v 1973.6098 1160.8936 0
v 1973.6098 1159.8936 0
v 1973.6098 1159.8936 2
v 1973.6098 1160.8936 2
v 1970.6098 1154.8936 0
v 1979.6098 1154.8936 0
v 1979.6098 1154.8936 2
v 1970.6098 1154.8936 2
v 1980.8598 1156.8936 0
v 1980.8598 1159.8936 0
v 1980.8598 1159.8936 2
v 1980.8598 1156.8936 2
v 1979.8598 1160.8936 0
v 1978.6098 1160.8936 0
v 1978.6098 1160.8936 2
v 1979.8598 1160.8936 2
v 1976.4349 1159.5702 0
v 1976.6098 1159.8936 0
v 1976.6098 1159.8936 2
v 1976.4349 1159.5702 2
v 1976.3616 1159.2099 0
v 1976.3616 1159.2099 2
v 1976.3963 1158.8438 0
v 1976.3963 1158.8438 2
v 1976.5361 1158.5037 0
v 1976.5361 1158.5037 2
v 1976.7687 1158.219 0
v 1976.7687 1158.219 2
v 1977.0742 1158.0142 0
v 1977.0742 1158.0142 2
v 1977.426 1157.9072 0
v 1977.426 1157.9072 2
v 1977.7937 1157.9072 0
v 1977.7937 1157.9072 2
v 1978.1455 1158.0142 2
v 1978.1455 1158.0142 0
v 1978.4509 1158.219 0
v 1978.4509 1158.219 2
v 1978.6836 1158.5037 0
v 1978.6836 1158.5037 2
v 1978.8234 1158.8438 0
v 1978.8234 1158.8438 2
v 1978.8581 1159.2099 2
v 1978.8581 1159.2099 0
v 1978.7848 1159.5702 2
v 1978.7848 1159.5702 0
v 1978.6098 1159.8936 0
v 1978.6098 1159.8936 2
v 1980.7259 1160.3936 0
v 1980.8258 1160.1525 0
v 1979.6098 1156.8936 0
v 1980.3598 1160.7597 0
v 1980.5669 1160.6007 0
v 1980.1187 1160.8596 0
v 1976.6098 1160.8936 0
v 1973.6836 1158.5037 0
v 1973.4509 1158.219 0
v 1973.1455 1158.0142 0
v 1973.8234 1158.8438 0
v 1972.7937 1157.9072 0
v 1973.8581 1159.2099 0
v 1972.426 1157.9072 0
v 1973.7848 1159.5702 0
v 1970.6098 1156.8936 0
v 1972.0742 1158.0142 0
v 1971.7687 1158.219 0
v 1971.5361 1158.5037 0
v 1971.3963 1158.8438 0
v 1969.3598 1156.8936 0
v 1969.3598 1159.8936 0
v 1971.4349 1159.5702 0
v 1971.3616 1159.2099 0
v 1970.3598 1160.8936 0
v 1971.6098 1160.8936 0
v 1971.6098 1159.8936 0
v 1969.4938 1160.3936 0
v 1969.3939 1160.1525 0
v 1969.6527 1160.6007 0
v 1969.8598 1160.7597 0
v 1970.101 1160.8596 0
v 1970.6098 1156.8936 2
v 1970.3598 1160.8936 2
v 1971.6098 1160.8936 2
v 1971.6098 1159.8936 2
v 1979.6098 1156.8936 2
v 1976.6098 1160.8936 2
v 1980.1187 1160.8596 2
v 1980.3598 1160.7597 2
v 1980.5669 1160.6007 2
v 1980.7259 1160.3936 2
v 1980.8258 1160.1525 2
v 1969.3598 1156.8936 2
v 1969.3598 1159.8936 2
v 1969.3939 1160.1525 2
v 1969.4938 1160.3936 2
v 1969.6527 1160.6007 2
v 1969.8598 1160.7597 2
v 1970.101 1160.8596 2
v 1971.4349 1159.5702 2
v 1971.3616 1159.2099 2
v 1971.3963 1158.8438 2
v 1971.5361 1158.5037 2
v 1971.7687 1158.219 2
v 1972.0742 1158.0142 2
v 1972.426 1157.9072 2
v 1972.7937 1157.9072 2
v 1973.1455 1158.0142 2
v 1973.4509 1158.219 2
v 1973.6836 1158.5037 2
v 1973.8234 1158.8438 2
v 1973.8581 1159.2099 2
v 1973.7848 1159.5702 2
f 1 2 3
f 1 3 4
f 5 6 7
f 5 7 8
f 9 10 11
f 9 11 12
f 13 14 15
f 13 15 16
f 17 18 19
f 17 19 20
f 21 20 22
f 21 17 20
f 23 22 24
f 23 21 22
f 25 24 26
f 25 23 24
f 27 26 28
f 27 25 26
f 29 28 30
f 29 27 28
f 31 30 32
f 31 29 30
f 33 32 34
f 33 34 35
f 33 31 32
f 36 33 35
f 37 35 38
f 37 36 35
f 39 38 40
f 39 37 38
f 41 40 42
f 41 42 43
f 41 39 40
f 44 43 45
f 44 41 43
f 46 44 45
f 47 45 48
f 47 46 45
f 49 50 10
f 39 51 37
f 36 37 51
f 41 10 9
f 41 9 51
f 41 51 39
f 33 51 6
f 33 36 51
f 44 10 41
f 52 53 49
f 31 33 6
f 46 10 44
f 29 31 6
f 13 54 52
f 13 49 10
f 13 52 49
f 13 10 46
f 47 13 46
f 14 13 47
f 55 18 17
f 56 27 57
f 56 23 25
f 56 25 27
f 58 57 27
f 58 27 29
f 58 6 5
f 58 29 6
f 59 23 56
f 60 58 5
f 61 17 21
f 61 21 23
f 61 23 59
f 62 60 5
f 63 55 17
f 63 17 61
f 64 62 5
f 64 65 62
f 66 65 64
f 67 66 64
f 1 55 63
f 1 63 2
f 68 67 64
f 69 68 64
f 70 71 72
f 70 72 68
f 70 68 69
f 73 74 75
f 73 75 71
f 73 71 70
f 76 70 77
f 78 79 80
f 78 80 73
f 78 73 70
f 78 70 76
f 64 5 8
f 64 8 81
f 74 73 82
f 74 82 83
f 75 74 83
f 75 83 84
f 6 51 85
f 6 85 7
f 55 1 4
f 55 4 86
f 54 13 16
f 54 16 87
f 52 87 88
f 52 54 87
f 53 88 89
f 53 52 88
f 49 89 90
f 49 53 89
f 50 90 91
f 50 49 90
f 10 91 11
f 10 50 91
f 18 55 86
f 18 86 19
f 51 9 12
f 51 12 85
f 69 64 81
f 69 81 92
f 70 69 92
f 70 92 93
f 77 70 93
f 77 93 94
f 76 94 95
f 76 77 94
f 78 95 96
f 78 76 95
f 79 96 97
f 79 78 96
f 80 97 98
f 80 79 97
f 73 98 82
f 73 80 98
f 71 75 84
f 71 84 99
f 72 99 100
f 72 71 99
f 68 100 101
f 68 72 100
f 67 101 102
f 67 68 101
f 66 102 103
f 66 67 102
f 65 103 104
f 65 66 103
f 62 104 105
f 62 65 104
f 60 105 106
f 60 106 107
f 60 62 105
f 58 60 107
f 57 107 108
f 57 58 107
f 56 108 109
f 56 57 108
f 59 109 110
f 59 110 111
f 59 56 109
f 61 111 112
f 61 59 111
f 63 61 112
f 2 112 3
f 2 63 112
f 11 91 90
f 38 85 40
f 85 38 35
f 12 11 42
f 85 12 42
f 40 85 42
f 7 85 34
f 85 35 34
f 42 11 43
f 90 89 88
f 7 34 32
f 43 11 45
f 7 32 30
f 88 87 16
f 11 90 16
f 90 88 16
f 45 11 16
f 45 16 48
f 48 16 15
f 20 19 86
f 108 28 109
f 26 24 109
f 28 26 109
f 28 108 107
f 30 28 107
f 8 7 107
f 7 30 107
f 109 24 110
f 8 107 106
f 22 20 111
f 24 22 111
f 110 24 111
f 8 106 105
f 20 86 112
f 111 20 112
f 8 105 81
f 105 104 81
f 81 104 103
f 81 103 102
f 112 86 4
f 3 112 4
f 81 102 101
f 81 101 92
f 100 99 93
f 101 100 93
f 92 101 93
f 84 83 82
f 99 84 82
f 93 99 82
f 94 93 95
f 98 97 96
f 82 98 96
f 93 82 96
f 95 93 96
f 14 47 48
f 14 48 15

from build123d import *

# Parameters (mm, degrees)
BOSS_EXTRUDE1_DEPTH = 2


with BuildPart() as part:
    # Model → Boss-Extrude1 (new body)
    with BuildSketch(Plane.XY):
        with BuildLine():
            Line((1971.609841287, 1160.893641222), (1971.609841287, 1159.893641222))
            ThreePointArc((1971.609841287, 1159.893641222), (1972.609841287, 1157.893641222), (1973.609841287, 1159.893641222))
            Line((1973.609841287, 1159.893641222), (1973.609841287, 1160.893641222))
            Line((1973.609841287, 1160.893641222), (1976.609841287, 1160.893641222))
            Line((1976.609841287, 1160.893641222), (1976.609841287, 1159.893641222))
            ThreePointArc((1976.609841287, 1159.893641222), (1977.609841287, 1157.893641222), (1978.609841287, 1159.893641222))
            Line((1978.609841287, 1159.893641222), (1978.609841287, 1160.893641222))
            Line((1978.609841287, 1160.893641222), (1979.859841287, 1160.893641222))
            ThreePointArc((1979.859841287, 1160.893641222), (1980.566948068, 1160.600748003), (1980.859841287, 1159.893641222))
            Line((1980.859841287, 1159.893641222), (1980.859841287, 1156.893641222))
            Line((1980.859841287, 1156.893641222), (1979.609841287, 1156.893641222))
            Line((1979.609841287, 1156.893641222), (1979.609841287, 1154.893641222))
            Line((1979.609841287, 1154.893641222), (1970.609841287, 1154.893641222))
            Line((1970.609841287, 1154.893641222), (1970.609841287, 1156.893641222))
            Line((1970.609841287, 1156.893641222), (1969.359841287, 1156.893641222))
            Line((1969.359841287, 1156.893641222), (1969.359841287, 1159.893641222))
            ThreePointArc((1969.359841287, 1159.893641222), (1969.652734505, 1160.600748003), (1970.359841287, 1160.893641222))
            Line((1970.359841287, 1160.893641222), (1971.609841287, 1160.893641222))
        make_face()
    extrude(amount=BOSS_EXTRUDE1_DEPTH)


solid = part.part
